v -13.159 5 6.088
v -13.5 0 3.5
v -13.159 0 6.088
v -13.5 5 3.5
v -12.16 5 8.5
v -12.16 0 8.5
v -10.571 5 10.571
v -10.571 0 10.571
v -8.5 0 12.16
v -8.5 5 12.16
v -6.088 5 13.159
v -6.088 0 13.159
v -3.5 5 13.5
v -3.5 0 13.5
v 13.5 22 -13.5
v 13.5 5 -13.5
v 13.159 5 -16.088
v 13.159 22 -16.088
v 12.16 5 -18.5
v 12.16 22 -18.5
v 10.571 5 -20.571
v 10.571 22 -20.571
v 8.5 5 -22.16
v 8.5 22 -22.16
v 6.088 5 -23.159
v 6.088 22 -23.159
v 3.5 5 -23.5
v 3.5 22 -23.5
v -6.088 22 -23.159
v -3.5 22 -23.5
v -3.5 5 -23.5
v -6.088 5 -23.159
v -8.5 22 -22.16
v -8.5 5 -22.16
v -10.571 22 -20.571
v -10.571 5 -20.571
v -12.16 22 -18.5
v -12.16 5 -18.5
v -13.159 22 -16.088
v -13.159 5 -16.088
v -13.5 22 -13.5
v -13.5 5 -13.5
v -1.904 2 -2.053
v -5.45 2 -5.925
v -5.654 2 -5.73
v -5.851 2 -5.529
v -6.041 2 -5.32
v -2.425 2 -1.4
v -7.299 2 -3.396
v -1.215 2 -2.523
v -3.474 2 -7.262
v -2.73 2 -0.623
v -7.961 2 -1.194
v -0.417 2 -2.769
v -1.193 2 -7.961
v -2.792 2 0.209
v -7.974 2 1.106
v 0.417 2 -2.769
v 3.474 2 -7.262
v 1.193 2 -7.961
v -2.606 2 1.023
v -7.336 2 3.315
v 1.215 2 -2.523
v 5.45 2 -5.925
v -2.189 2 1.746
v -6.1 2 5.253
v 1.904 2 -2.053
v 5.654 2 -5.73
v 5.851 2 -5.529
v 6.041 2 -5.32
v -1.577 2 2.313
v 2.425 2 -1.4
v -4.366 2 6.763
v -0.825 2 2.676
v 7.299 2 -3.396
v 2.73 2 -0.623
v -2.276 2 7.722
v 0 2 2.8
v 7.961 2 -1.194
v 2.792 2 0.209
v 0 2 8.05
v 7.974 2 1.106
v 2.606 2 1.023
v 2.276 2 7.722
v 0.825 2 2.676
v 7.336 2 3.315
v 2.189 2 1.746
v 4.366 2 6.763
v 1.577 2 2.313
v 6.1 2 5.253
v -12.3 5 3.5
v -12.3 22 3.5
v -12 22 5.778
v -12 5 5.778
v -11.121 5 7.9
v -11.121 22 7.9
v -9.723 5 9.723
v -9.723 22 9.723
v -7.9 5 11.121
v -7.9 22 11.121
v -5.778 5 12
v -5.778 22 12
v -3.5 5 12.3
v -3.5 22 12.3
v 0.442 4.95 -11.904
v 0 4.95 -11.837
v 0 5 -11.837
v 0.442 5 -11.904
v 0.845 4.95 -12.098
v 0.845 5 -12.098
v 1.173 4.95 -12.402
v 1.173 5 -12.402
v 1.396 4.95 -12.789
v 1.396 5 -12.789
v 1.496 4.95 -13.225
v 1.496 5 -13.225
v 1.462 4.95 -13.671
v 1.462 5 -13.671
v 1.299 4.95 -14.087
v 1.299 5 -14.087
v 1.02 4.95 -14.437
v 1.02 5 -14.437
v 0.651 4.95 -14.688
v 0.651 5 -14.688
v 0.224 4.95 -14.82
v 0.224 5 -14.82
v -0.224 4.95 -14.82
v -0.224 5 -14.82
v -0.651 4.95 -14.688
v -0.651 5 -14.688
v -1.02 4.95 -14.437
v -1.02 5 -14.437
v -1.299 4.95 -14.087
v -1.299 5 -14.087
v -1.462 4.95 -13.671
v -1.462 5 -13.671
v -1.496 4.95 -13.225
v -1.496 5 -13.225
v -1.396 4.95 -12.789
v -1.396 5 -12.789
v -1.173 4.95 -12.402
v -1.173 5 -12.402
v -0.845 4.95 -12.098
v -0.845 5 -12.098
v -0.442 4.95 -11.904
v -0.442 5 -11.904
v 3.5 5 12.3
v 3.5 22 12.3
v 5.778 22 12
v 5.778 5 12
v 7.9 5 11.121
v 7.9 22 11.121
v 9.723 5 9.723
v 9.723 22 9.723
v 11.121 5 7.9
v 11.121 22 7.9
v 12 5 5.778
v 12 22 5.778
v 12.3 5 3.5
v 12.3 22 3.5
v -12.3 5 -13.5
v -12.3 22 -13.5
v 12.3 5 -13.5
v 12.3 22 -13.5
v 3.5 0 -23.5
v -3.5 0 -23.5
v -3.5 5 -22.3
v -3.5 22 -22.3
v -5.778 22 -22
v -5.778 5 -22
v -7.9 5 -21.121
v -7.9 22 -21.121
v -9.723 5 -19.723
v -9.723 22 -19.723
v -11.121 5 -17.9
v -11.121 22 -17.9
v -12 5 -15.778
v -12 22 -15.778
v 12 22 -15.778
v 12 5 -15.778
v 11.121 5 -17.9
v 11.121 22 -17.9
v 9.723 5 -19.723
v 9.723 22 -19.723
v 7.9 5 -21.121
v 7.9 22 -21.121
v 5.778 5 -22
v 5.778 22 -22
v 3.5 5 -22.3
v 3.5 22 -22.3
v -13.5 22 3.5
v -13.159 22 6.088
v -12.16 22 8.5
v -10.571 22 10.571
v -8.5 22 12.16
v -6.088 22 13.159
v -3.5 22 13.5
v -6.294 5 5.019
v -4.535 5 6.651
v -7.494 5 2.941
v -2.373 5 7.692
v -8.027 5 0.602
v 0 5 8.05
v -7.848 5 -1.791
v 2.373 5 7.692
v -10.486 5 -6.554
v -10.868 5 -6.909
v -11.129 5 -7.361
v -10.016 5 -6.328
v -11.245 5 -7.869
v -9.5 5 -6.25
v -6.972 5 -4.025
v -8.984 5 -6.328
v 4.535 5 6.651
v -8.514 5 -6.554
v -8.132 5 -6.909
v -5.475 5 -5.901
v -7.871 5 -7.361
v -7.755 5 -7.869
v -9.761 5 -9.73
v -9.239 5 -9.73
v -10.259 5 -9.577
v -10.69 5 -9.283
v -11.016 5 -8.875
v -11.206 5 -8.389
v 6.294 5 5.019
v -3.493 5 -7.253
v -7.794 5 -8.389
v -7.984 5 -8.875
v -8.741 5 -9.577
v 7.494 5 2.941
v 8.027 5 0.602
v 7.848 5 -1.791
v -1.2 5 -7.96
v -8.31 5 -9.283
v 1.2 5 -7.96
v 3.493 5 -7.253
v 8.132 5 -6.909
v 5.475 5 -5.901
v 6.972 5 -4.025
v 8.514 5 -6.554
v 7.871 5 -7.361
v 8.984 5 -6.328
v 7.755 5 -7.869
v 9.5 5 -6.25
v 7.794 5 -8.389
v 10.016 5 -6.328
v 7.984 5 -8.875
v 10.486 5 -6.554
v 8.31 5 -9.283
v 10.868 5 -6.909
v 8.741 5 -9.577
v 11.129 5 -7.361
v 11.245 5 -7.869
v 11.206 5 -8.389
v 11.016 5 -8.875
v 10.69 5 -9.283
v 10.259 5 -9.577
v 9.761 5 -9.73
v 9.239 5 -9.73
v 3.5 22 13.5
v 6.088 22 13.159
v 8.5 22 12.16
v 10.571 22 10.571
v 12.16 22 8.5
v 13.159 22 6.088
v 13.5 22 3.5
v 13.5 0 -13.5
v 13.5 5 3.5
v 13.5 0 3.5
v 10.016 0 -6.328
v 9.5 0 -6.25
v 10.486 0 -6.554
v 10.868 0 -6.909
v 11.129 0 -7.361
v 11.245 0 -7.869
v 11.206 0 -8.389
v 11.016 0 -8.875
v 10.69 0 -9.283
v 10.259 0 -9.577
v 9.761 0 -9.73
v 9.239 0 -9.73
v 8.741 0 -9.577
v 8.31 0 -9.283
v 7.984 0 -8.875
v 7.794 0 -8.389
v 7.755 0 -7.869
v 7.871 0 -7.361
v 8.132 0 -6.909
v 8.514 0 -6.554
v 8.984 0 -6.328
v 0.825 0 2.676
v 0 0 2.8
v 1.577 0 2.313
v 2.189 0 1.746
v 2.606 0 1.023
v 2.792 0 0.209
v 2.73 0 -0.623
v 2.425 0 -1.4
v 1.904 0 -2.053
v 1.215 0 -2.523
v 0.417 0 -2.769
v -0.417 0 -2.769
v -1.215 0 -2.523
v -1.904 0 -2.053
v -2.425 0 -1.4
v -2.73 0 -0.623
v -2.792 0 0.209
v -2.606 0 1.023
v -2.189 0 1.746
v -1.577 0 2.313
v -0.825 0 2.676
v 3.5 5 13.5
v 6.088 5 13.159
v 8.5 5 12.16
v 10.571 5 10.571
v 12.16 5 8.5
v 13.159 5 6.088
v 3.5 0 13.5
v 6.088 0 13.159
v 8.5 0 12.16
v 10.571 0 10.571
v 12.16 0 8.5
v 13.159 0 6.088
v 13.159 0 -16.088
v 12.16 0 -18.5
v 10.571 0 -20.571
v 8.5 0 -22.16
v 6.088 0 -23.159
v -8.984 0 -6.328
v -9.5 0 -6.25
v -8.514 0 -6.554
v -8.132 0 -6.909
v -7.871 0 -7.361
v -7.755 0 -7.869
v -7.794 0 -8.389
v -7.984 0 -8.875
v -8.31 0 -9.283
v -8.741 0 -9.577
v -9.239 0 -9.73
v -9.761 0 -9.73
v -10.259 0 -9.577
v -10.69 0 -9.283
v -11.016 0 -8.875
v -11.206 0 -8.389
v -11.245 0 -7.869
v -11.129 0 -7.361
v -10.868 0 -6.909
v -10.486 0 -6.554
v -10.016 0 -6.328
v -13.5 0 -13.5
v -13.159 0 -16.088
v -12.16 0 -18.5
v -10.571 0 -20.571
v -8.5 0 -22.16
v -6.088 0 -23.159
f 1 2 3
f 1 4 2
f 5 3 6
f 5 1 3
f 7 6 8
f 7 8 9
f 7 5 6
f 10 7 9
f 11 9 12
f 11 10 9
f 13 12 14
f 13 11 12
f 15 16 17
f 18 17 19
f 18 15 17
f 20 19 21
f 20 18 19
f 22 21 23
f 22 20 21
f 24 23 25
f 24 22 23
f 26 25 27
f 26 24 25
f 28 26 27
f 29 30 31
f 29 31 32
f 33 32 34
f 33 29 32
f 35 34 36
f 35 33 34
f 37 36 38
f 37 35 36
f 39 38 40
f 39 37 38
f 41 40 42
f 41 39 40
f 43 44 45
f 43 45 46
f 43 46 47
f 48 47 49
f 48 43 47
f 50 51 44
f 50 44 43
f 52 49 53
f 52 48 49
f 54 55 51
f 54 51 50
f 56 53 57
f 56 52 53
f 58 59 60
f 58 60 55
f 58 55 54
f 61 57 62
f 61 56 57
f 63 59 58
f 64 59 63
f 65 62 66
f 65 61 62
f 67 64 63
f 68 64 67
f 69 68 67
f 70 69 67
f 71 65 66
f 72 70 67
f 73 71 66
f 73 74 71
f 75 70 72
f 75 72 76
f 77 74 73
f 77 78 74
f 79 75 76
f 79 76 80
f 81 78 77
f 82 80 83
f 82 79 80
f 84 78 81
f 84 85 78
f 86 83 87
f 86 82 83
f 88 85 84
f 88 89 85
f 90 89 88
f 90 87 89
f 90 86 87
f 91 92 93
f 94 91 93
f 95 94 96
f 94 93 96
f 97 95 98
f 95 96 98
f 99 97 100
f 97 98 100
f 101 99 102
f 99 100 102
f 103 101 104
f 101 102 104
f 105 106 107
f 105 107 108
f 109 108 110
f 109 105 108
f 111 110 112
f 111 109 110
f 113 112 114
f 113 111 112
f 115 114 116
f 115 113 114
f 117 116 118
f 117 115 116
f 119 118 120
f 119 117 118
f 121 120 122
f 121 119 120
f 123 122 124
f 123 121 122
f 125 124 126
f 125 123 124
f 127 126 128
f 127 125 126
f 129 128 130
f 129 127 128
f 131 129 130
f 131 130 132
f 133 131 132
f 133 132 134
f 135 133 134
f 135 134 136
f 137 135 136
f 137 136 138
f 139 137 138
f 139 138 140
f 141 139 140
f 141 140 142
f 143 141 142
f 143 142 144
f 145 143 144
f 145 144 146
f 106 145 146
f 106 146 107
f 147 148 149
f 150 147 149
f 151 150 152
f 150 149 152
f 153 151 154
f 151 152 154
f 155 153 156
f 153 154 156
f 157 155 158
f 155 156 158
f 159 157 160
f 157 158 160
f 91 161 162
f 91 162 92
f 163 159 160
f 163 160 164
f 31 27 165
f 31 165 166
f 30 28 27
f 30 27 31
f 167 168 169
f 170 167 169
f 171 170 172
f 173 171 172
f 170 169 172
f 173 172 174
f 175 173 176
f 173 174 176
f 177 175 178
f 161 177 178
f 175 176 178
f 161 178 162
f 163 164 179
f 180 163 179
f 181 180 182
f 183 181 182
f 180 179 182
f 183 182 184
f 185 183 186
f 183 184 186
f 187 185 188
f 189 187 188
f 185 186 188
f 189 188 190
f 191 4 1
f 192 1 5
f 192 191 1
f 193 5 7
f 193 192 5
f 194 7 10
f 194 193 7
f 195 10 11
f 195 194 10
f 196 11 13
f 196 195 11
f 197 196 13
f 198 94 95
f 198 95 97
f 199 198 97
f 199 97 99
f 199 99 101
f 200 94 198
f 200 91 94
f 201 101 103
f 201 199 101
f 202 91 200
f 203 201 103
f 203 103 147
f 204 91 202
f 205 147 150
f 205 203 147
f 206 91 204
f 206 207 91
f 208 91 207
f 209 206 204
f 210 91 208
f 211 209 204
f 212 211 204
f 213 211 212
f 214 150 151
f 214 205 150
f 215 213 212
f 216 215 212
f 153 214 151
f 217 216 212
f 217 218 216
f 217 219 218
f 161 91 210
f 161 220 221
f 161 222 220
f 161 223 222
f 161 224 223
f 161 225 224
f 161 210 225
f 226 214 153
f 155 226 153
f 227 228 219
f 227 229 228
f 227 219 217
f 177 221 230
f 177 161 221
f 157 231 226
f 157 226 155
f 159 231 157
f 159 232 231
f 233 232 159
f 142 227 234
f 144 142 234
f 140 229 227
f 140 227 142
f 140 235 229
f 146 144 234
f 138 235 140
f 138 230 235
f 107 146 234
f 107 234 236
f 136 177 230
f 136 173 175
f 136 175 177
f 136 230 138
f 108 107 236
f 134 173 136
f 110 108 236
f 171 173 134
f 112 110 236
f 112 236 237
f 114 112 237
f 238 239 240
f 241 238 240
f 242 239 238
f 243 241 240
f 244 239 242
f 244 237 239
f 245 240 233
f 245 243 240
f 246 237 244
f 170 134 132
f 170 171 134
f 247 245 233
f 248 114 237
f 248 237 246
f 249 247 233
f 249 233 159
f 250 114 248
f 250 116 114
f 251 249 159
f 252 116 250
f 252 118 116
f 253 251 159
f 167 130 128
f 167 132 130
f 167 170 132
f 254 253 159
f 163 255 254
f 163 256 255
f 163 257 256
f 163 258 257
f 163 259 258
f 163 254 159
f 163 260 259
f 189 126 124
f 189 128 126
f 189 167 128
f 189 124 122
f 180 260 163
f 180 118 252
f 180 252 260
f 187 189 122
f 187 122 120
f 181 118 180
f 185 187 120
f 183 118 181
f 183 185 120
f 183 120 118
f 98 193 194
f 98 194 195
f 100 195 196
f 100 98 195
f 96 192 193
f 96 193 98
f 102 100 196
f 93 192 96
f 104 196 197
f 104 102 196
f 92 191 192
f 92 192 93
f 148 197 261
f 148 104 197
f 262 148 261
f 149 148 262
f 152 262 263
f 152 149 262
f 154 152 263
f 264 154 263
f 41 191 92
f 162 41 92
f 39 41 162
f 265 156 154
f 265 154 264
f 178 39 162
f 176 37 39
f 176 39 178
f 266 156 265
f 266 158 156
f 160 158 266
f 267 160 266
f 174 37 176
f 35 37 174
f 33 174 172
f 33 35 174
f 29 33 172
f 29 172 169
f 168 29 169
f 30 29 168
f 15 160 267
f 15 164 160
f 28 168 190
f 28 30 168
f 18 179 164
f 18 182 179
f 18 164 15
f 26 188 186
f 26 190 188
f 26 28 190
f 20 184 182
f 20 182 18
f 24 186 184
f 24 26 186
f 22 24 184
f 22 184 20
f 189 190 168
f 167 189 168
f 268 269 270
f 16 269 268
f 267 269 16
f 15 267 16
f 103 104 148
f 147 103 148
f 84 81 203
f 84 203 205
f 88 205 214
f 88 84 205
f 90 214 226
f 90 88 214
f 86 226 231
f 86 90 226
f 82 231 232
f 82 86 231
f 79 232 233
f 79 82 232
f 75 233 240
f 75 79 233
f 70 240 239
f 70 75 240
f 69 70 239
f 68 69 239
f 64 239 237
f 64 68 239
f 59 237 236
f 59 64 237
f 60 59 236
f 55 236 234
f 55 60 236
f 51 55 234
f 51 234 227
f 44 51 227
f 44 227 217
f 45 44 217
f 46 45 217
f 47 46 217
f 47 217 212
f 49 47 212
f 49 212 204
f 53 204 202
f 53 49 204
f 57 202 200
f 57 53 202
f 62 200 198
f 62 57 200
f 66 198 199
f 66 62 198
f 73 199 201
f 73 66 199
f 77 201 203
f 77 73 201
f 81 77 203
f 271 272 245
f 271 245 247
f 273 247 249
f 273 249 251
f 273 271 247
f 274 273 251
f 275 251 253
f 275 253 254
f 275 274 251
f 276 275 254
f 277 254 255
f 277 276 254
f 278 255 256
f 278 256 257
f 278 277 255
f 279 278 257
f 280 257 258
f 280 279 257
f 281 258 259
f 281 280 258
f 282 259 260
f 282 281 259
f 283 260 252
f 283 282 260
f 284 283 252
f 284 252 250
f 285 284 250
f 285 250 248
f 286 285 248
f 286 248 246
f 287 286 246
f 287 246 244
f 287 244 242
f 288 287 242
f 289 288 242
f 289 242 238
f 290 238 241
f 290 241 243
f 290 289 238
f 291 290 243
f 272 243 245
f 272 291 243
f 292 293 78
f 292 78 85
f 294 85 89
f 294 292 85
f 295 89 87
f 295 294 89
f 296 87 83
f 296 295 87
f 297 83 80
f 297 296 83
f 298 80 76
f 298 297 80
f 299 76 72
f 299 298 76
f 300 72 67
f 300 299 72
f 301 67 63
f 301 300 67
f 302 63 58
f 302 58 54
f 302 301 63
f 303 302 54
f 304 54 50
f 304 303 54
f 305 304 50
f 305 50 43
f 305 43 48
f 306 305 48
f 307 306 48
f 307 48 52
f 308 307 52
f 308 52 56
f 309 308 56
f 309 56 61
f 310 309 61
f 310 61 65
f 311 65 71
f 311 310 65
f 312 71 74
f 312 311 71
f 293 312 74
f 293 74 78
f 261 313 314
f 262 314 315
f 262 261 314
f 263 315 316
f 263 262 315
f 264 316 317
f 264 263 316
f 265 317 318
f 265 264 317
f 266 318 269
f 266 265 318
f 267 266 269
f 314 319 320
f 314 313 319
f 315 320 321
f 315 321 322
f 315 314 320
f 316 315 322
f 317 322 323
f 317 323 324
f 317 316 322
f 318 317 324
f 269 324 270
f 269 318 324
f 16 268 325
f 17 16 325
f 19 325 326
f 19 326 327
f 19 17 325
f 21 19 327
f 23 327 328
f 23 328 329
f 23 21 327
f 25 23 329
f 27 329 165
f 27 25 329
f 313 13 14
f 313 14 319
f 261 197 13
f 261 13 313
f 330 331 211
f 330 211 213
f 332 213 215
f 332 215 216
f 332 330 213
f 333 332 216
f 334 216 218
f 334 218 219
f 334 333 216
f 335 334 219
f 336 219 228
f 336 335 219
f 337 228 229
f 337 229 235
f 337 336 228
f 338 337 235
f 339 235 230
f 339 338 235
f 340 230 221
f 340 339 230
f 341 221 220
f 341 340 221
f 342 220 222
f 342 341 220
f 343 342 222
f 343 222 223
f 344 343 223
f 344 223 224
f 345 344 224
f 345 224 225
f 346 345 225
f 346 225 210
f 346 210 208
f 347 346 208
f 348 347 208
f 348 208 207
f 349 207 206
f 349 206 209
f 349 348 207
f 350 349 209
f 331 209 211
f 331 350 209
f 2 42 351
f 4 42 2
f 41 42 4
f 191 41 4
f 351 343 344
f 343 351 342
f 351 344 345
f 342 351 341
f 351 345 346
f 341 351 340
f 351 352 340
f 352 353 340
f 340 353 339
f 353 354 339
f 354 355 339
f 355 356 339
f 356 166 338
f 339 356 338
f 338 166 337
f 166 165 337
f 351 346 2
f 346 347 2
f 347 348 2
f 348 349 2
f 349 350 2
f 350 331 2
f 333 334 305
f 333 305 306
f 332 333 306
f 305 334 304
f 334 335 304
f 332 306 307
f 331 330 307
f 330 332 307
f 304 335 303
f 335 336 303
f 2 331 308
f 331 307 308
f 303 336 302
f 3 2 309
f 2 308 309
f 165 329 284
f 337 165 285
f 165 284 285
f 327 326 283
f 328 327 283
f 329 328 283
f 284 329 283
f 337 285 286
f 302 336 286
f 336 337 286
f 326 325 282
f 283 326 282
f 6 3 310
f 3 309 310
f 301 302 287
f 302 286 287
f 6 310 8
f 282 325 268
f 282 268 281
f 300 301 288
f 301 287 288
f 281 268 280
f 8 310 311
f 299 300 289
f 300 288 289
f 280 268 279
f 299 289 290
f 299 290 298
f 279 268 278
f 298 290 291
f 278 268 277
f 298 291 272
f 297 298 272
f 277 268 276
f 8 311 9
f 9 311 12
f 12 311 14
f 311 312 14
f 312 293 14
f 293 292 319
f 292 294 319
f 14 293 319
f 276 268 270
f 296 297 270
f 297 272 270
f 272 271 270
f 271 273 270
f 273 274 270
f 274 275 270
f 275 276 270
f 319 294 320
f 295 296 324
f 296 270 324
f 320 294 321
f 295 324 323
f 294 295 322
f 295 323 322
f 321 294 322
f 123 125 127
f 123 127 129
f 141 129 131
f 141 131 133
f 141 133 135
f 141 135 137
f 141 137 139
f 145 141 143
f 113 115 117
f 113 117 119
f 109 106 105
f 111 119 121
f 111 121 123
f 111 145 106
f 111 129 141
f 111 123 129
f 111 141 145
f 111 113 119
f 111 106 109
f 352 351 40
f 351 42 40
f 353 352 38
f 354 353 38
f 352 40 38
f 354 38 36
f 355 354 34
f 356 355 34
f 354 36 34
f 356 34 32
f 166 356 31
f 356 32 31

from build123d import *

# Parameters (mm, degrees)
SKETCH1_W           = 27
SKETCH1_H           = 37
SKETCH1_R           = 8.05
SKETCH1_R_2         = 1.5
SKETCH1_R_3         = 1.75
BOSS_EXTRUDE1_DEPTH = 5
SKETCH1_4_R         = 1.5
BOSS_EXTRUDE3_DEPTH = 4.95
SKETCH1_5_R         = 8.05
SKETCH1_5_R_2       = 2.8
BOSS_EXTRUDE4_DEPTH = 2
FILLET1_R           = 10
BOSS_EXTRUDE5_START = 17
BOSS_EXTRUDE5_DEPTH = 17


with BuildPart() as part:
    # Sketch1 → Boss-Extrude1 (new body)
    with BuildSketch(Plane(origin=(0, 0, 0), x_dir=(1, 0, 0), z_dir=(0, 1, 0))):
        with Locations((0, 5)):
            Rectangle(SKETCH1_W, SKETCH1_H)
        with Locations(Location((0, 0, 0), (0, 0, 270))):
            Circle(SKETCH1_R, mode=Mode.SUBTRACT)
        with Locations(Location((0, 13.337, 0), (0, 0, 270))):
            Circle(SKETCH1_R_2, mode=Mode.SUBTRACT)
        with Locations(Location((-9.5, 8, 0), (0, 0, 270))):
            Circle(SKETCH1_R_3, mode=Mode.SUBTRACT)
        with Locations(Location((9.5, 8, 0), (0, 0, 270))):
            Circle(SKETCH1_R_3, mode=Mode.SUBTRACT)
    extrude(amount=BOSS_EXTRUDE1_DEPTH)

    # Sketch1<4> → Boss-Extrude3 (add)
    with BuildSketch(Plane(origin=(0, 0, 0), x_dir=(1, 0, 0), z_dir=(0, 1, 0))):
        with Locations(Location((0, 13.337, 0), (0, 0, 270))):
            Circle(SKETCH1_4_R)
    extrude(amount=BOSS_EXTRUDE3_DEPTH)

    # Sketch1<5> → Boss-Extrude4 (add)
    # profile 1 of 3: a face of its own
    with BuildSketch(Plane(origin=(0, 0, 0), x_dir=(1, 0, 0), z_dir=(0, 1, 0))):
        with Locations(Location((0, 0, 0), (0, 0, 270))):
            Circle(SKETCH1_5_R)
        with Locations(Location((0, 0, 0), (0, 0, 270))):
            Circle(SKETCH1_5_R_2, mode=Mode.SUBTRACT)
    # profile 2 of 3: a face of its own
    with BuildSketch(Plane(origin=(0, 0, 0), x_dir=(1, 0, 0), z_dir=(0, 1, 0))):
        with BuildLine():
            ThreePointArc((-5.45, 5.924525297), (-5.753510872, 5.630240905), (-6.041153839, 5.320428582))
            Line((-6.041153839, 5.320428582), (-5.45, 5.66173141))
            Line((-5.45, 5.66173141), (-5.45, 5.924525297))
        make_face()
    # profile 3 of 3: a face of its own
    with BuildSketch(Plane(origin=(0, 0, 0), x_dir=(1, 0, 0), z_dir=(0, 1, 0))):
        with BuildLine():
            Line((5.45, 5.66173141), (6.041153839, 5.320428582))
            ThreePointArc((6.041153839, 5.320428582), (5.753510872, 5.630240905), (5.45, 5.924525297))
            Line((5.45, 5.924525297), (5.45, 5.66173141))
        make_face()
    extrude(amount=BOSS_EXTRUDE4_DEPTH)

    # Fillet1
    fillet1_edges = [part.edges().sort_by_distance(p)[0] for p in [
        (-13.5, 2.5, -23.5),
        (13.5, 2.5, -23.5),
        (13.5, 2.5, 13.5),
        (-13.5, 2.5, 13.5),
    ]]
    fillet(fillet1_edges, radius=FILLET1_R)

    # Sketch2 → Boss-Extrude5 (add)
    with BuildSketch(Plane(origin=(0, 5, 0), x_dir=(1, 0, 0), z_dir=(0, 1, 0)).offset(BOSS_EXTRUDE5_START)):
        with BuildLine():
            Line((13.5, -3.5), (13.5, 13.5))
            ThreePointArc((13.5, 13.5), (10.571067812, 20.571067812), (3.5, 23.5))
            Line((3.5, 23.5), (-3.5, 23.5))
            ThreePointArc((-3.5, 23.5), (-10.571067812, 20.571067812), (-13.5, 13.5))
            Line((-13.5, 13.5), (-13.5, -3.5))
            ThreePointArc((-13.5, -3.5), (-10.571067812, -10.571067812), (-3.5, -13.5))
            Line((-3.5, -13.5), (3.5, -13.5))
            ThreePointArc((3.5, -13.5), (10.571067812, -10.571067812), (13.5, -3.5))
        make_face()
        with BuildLine():
            Line((-12.3, 13.5), (-12.3, -3.5))
            ThreePointArc((-12.3, -3.5), (-9.722539674, -9.722539674), (-3.5, -12.3))
            Line((-3.5, -12.3), (3.5, -12.3))
            ThreePointArc((3.5, -12.3), (9.722539674, -9.722539674), (12.3, -3.5))
            Line((12.3, -3.5), (12.3, 13.5))
            ThreePointArc((12.3, 13.5), (9.722539674, 19.722539674), (3.5, 22.3))
            Line((3.5, 22.3), (-3.5, 22.3))
            ThreePointArc((-3.5, 22.3), (-9.722539674, 19.722539674), (-12.3, 13.5))
        make_face(mode=Mode.SUBTRACT)
    extrude(amount=-BOSS_EXTRUDE5_DEPTH)


solid = part.part
